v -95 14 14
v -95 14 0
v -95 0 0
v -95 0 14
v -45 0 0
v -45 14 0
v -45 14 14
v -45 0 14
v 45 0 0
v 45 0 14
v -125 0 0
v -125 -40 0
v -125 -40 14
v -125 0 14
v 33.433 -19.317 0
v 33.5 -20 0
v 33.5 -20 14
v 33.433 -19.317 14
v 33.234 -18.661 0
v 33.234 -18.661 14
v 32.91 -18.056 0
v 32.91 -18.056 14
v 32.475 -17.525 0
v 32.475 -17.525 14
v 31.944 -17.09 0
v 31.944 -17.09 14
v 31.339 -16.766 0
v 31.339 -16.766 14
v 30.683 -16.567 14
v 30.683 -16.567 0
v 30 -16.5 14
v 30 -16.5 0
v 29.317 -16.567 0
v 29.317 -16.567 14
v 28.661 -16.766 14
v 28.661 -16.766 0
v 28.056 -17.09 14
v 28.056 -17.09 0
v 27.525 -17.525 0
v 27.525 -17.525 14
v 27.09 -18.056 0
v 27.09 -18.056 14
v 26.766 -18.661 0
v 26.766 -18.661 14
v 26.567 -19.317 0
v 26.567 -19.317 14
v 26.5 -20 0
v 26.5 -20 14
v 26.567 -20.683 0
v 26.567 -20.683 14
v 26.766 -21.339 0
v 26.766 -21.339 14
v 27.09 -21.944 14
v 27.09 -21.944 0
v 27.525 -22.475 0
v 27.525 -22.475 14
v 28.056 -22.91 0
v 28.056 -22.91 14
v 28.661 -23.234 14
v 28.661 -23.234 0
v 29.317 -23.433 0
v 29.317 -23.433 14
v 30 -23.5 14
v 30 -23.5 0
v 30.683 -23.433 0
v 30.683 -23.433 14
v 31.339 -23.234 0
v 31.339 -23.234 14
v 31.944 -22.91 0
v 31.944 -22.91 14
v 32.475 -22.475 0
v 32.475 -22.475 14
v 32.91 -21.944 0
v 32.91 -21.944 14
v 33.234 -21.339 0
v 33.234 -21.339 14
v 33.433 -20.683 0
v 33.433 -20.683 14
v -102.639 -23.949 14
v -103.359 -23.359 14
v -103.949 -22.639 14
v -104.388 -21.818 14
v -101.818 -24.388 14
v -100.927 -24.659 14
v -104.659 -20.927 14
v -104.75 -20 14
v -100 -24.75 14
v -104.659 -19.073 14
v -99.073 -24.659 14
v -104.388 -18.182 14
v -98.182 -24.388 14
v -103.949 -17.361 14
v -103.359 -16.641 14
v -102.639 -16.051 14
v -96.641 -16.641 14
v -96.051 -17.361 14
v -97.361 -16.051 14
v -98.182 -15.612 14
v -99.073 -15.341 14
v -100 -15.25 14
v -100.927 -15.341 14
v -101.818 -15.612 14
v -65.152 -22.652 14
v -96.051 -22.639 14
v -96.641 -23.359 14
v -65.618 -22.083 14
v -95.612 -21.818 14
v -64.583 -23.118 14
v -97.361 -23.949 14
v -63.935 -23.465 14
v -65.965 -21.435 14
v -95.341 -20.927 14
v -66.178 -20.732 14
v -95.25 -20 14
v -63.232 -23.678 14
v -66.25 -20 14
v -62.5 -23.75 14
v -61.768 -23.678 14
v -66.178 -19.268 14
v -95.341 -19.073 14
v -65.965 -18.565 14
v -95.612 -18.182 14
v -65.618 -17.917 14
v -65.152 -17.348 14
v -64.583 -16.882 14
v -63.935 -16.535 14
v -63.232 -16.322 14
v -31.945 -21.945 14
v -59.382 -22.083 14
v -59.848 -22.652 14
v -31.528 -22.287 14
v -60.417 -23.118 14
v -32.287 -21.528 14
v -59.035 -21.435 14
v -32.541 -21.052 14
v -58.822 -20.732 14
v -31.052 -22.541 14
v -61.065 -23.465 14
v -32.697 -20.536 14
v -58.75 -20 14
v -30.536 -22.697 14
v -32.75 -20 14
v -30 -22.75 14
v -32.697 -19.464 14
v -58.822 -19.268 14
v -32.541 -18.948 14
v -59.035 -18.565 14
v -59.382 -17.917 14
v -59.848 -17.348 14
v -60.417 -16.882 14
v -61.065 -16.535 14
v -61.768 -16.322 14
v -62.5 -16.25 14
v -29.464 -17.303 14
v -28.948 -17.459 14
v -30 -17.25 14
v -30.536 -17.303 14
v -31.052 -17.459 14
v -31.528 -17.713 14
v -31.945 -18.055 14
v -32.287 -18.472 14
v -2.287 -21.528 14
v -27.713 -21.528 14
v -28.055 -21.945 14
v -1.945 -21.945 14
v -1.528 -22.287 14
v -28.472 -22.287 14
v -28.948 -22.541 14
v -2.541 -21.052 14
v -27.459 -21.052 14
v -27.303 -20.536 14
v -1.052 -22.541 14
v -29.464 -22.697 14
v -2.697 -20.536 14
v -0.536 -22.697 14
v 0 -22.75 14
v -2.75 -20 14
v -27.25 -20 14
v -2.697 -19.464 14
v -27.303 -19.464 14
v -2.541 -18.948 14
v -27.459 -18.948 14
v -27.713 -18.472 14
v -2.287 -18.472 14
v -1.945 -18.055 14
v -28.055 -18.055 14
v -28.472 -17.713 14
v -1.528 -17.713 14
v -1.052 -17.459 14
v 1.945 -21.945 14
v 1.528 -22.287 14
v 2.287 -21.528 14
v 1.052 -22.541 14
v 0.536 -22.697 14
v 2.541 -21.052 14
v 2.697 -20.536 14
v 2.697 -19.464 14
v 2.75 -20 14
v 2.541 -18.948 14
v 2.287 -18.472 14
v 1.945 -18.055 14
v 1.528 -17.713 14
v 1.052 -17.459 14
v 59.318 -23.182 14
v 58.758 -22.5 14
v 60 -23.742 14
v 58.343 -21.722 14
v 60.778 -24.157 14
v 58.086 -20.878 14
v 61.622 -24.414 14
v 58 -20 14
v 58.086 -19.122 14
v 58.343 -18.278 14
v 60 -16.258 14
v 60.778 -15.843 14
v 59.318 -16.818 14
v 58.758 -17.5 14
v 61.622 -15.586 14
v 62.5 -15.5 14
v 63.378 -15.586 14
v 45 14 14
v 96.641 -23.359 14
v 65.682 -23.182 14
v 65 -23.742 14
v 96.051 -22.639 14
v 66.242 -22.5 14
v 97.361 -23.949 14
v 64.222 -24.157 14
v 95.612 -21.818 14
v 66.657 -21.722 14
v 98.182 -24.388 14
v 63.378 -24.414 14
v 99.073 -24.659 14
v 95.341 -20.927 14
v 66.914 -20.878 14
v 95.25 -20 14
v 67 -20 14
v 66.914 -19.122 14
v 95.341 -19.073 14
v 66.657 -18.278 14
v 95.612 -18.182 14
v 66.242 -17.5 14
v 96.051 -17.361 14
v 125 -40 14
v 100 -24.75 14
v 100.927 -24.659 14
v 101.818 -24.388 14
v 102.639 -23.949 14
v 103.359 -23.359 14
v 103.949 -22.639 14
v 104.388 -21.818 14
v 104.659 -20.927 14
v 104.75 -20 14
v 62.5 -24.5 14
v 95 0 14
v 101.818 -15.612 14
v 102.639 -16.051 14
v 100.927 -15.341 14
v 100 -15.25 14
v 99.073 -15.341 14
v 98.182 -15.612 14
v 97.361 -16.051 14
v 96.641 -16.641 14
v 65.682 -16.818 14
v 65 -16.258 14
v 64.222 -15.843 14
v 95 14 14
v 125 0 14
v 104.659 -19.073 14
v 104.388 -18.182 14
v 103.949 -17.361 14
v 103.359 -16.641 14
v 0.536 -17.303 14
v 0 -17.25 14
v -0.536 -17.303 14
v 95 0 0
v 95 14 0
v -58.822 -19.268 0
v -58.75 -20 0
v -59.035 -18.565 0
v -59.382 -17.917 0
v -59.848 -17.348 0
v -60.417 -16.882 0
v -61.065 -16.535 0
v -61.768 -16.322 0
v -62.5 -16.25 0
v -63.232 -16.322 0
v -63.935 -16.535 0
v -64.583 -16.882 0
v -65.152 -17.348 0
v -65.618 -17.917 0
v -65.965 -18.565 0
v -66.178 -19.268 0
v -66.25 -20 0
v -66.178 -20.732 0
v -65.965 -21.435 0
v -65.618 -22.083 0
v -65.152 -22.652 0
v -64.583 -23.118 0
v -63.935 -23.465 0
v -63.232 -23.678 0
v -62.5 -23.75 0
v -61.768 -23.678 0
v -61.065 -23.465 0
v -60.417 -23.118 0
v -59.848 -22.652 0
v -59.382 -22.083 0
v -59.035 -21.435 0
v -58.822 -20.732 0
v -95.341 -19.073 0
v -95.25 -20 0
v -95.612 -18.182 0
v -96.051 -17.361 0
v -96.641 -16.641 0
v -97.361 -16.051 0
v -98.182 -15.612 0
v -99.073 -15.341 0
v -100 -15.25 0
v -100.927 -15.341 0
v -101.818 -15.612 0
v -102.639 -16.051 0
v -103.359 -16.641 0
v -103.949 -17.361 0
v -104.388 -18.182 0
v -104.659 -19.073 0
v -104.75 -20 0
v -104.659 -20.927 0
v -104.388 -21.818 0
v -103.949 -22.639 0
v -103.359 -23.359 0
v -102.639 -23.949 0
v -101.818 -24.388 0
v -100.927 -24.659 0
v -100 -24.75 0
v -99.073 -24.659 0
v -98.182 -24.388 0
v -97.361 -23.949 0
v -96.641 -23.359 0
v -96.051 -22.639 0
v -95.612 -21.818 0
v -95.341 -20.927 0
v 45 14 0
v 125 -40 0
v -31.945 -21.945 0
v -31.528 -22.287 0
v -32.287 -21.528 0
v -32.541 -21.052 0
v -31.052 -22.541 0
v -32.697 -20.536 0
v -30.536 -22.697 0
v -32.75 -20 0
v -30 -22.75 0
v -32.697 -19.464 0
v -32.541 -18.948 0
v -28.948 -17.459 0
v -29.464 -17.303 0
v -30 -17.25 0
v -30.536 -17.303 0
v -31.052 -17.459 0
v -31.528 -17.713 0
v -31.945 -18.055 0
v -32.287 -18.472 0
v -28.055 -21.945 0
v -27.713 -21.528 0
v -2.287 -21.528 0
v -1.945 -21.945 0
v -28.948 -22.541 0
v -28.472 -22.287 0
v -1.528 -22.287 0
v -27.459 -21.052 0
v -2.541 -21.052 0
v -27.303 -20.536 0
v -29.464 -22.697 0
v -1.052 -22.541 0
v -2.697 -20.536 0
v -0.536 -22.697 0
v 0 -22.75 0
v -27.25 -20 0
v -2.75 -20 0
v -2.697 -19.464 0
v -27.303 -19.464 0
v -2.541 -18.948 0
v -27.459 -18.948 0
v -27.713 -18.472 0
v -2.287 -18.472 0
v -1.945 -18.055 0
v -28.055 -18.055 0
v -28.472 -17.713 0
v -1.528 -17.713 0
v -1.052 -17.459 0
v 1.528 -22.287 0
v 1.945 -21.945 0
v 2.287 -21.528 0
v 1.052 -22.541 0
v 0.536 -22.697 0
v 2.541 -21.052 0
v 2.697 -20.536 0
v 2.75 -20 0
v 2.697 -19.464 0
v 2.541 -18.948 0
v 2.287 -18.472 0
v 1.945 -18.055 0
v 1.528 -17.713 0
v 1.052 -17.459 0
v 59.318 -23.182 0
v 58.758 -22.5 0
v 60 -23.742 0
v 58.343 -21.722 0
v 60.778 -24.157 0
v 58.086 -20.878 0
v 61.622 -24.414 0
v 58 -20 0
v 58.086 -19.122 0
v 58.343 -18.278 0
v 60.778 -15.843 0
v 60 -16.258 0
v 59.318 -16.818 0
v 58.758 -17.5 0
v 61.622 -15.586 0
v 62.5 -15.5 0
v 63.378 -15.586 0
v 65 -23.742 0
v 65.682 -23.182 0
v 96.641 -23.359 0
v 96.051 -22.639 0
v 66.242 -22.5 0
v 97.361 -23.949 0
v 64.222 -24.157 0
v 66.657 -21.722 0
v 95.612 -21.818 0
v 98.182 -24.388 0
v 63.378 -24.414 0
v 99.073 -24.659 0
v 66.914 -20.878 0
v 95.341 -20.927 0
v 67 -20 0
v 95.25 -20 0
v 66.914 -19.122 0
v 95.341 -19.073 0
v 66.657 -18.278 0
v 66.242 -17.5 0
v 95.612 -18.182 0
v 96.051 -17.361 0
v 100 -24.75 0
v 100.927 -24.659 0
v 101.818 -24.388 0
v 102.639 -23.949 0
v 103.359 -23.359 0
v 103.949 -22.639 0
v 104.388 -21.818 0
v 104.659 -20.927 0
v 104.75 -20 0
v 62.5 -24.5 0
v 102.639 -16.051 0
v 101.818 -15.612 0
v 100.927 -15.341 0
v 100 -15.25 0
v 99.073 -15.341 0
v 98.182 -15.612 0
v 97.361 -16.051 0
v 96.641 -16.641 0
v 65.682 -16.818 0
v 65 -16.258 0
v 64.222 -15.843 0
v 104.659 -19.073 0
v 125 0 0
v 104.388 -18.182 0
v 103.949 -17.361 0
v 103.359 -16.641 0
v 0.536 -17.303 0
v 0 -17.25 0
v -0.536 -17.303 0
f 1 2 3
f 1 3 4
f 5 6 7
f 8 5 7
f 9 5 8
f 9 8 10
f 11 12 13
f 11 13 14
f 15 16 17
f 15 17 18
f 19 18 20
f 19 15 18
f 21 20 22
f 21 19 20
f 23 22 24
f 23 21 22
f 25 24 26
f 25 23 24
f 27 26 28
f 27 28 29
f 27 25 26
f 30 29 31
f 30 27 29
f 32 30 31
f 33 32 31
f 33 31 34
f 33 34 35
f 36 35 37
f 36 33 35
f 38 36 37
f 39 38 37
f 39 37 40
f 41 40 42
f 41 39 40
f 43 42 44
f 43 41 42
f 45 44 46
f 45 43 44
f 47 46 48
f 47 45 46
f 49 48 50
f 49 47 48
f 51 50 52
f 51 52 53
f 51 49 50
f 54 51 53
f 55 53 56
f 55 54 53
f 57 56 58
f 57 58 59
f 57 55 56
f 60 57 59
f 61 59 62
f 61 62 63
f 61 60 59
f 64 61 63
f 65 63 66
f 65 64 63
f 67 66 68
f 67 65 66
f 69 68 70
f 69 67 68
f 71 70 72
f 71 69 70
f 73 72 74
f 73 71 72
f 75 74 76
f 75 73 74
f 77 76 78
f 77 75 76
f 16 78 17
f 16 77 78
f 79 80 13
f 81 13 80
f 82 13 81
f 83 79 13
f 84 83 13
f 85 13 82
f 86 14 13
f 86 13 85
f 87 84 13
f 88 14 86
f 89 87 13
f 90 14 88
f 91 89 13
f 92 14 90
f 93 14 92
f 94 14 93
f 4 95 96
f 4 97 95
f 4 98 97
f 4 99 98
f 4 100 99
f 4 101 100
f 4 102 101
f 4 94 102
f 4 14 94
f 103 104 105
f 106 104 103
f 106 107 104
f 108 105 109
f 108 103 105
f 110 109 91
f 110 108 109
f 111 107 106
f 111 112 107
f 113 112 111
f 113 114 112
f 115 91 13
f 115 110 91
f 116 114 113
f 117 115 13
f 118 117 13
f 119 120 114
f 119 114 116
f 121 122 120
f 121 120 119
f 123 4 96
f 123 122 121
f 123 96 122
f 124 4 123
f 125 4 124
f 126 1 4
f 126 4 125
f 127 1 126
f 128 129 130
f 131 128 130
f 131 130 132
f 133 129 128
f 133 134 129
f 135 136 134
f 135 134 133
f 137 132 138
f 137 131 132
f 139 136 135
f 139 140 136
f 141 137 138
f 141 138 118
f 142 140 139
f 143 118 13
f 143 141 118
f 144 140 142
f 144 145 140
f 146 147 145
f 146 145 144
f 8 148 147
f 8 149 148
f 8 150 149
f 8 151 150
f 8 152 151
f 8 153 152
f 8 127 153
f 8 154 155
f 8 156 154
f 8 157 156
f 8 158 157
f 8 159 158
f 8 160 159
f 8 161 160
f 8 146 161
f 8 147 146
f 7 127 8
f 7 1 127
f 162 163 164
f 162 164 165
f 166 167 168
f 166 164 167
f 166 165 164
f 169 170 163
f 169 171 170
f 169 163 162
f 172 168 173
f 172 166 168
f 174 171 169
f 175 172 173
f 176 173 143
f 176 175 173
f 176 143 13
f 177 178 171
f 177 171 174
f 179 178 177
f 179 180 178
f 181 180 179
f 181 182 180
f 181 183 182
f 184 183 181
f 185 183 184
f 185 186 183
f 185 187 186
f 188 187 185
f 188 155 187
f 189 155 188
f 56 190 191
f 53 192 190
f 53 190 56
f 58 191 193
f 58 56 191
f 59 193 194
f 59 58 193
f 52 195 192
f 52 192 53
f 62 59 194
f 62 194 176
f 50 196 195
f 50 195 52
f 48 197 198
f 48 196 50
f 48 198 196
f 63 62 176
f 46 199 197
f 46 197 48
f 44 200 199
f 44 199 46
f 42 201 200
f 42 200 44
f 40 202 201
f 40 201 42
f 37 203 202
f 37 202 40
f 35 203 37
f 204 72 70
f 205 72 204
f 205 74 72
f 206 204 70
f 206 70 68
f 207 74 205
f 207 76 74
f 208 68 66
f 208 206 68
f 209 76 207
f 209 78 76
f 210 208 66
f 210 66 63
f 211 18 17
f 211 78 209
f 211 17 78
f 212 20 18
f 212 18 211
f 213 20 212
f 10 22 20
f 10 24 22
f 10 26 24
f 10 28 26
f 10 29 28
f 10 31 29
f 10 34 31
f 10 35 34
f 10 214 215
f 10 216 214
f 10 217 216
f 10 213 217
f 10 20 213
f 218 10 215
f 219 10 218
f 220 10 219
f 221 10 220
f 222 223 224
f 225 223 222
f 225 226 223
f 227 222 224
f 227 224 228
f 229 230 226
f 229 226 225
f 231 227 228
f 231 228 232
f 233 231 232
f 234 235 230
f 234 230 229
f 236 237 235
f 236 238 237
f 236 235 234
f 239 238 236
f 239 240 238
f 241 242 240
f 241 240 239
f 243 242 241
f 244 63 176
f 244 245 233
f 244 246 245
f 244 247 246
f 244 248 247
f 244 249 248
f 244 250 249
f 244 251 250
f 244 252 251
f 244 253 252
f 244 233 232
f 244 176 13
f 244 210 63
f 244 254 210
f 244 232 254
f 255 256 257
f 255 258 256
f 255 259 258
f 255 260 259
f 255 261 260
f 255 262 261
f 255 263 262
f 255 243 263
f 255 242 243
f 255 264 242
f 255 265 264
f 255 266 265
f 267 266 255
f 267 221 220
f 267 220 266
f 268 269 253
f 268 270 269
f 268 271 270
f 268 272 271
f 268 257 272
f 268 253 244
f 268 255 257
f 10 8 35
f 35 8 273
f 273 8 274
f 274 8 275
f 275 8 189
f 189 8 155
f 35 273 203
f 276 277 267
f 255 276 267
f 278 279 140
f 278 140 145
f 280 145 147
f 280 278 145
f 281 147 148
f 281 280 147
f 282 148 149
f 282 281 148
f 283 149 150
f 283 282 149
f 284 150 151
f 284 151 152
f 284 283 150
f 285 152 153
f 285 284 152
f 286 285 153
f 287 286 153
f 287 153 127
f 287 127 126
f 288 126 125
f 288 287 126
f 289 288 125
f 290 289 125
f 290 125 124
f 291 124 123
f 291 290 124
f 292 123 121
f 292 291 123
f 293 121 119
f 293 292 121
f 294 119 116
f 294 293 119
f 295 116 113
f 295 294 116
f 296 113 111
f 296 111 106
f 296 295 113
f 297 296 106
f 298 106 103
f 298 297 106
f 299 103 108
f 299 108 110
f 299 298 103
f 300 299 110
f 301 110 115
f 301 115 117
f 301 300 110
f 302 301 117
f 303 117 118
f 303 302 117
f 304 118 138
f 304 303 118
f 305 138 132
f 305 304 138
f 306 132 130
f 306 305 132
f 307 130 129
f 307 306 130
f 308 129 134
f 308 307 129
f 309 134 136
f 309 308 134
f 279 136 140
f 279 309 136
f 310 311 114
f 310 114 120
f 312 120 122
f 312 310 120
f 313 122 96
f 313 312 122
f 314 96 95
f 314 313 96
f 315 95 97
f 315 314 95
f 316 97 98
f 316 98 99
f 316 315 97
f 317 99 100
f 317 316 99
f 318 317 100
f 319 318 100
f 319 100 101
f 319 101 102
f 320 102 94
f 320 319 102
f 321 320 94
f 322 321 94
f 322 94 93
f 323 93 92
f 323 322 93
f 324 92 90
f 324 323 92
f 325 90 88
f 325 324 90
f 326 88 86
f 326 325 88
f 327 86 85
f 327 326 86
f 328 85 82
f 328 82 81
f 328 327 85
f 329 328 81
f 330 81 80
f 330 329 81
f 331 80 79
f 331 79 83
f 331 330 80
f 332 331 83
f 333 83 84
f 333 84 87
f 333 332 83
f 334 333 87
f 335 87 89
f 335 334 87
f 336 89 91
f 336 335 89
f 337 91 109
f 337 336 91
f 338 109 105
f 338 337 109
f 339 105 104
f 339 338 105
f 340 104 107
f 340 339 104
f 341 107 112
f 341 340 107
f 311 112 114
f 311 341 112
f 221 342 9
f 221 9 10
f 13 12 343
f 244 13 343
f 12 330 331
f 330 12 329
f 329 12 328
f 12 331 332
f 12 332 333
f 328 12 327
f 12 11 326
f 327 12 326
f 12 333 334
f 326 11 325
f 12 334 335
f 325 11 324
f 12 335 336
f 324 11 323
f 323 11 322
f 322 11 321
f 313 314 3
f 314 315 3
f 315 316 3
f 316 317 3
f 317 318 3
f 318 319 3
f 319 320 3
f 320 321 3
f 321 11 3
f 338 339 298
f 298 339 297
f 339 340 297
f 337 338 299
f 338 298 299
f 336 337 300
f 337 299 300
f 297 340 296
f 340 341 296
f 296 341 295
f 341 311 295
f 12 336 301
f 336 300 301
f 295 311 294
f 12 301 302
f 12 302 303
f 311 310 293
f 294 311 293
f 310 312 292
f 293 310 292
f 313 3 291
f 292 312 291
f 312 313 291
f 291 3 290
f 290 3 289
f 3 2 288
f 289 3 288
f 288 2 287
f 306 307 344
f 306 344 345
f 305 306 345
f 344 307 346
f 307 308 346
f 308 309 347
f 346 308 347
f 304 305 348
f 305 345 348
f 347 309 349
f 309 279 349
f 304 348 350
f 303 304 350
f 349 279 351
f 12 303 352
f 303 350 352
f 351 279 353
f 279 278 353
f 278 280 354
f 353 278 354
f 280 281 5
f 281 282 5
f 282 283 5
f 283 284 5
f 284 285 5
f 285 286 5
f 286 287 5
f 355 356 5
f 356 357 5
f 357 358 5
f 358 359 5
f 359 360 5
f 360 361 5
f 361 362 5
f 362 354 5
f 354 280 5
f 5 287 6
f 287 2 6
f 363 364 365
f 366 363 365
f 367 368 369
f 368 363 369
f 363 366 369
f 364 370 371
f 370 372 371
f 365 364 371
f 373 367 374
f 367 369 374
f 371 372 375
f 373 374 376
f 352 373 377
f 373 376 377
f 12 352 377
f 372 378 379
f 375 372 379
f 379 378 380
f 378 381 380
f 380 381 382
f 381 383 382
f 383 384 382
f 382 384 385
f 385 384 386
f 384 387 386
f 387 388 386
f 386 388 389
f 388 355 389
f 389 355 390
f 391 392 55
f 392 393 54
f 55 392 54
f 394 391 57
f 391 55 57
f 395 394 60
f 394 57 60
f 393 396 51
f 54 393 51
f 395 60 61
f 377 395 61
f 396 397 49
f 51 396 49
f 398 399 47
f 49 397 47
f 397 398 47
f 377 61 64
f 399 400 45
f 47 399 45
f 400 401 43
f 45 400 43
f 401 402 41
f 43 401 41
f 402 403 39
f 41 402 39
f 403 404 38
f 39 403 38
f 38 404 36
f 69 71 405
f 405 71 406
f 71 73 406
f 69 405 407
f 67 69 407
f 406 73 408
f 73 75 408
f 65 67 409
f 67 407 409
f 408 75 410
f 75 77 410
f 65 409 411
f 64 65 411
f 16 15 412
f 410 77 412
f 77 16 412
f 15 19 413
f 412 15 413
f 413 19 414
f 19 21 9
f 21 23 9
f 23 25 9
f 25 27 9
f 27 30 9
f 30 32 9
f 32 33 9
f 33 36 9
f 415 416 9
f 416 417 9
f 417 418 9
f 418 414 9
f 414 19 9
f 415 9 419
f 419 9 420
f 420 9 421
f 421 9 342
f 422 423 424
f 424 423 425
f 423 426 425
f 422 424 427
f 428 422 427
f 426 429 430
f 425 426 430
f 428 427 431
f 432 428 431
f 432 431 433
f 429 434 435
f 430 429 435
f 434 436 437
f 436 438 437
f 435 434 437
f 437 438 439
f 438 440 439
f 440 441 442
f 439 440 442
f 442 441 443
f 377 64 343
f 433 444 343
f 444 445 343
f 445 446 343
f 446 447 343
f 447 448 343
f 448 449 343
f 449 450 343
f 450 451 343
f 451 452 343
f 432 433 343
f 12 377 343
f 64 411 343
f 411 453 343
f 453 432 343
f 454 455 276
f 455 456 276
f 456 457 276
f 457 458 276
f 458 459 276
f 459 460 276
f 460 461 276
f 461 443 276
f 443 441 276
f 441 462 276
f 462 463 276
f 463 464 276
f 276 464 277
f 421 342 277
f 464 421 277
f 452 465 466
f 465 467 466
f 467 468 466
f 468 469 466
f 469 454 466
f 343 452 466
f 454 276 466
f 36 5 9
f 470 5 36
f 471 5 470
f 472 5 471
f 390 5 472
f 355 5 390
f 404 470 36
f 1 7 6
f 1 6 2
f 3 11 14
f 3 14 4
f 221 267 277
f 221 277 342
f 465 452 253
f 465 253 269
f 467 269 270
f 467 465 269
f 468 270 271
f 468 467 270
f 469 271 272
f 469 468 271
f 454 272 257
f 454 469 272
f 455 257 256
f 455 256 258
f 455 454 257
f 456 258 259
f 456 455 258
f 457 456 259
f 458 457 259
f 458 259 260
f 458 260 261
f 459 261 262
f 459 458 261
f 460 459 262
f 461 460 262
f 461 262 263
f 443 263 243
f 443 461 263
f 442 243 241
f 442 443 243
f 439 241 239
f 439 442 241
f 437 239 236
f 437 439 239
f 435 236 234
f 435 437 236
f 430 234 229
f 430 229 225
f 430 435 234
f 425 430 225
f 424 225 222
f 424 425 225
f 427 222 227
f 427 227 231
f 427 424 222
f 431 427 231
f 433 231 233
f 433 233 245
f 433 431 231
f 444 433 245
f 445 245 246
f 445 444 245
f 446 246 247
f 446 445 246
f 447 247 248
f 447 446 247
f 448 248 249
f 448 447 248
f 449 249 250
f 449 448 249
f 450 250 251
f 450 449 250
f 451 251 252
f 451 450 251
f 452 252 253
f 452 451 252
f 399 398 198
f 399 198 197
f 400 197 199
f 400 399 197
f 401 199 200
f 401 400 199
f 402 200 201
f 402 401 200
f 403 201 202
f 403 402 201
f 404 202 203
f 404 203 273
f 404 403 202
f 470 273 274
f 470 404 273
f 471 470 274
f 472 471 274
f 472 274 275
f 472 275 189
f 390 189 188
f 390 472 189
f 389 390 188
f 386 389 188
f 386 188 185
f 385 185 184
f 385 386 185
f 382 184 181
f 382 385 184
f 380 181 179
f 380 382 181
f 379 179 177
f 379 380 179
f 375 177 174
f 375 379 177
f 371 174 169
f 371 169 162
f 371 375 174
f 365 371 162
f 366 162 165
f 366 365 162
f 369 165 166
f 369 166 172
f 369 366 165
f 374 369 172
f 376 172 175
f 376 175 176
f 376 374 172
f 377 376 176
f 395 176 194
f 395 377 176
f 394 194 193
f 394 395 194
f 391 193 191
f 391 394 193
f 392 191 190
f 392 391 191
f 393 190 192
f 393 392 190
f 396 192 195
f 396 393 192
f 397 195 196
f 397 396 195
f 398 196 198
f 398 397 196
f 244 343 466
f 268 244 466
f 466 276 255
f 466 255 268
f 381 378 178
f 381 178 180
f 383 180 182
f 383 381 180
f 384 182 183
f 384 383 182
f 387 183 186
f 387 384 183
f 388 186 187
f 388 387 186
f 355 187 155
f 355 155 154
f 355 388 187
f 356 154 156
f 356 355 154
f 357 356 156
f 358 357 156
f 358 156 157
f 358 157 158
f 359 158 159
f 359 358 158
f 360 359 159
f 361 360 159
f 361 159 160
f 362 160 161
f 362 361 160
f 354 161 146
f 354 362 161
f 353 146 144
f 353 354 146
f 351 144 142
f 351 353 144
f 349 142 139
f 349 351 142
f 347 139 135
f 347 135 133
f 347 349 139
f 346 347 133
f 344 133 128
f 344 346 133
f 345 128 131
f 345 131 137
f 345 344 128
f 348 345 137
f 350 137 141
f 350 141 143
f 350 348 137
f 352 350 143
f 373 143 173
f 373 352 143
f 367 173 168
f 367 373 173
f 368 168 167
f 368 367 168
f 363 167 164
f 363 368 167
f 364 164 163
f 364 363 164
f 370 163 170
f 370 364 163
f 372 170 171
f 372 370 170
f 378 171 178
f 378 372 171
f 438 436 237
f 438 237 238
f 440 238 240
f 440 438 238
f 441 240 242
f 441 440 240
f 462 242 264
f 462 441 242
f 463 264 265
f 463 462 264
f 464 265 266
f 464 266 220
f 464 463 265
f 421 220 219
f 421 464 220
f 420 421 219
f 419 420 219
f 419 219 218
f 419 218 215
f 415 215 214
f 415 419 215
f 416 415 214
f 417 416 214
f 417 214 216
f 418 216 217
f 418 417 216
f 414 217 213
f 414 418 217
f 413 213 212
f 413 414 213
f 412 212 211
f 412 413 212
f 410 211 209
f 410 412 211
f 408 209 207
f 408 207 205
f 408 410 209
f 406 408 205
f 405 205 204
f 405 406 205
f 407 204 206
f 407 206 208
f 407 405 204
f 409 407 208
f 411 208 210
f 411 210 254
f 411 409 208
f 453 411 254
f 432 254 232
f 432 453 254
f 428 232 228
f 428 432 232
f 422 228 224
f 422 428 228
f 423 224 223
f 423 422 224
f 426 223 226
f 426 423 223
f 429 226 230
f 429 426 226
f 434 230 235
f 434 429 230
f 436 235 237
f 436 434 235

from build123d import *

# Parameters (mm, degrees)
F0_W     = 250
F0_H     = 40
F0_R     = 4.75
F0_R_2   = 3.75
F0_R_3   = 2.75
F0_R_4   = 3.5
F0_R_5   = 4.5
F1_DEPTH = 14
F2_W     = 50
F2_H     = 14
F3_DEPTH = 14


with BuildPart() as f1:
    # F0 (on Top) → F1 (new body)
    with BuildSketch(Plane.XY):
        with Locations((0, -20)):
            Rectangle(F0_W, F0_H)
        with Locations((-100, -20)):
            Circle(F0_R, mode=Mode.SUBTRACT)
        with Locations((-62.5, -20)):
            Circle(F0_R_2, mode=Mode.SUBTRACT)
        with Locations((-30, -20)):
            Circle(F0_R_3, mode=Mode.SUBTRACT)
        with Locations((0, -20)):
            Circle(F0_R_3, mode=Mode.SUBTRACT)
        with Locations((30, -20)):
            Circle(F0_R_4, mode=Mode.SUBTRACT)
        with Locations((62.5, -20)):
            Circle(F0_R_5, mode=Mode.SUBTRACT)
        with Locations((100, -20)):
            Circle(F0_R, mode=Mode.SUBTRACT)
    extrude(amount=F1_DEPTH)

    # F2 (on face) → F3 (join)
    with BuildSketch(Plane(origin=(0, 0, 0), x_dir=(-1, 0, 0), z_dir=(0, 1, 0))):
        with Locations((70, 7)):
            Rectangle(F2_W, F2_H)
        with Locations((-70, 7)):
            Rectangle(F2_W, F2_H)
    extrude(amount=F3_DEPTH)


solid = f1.part
